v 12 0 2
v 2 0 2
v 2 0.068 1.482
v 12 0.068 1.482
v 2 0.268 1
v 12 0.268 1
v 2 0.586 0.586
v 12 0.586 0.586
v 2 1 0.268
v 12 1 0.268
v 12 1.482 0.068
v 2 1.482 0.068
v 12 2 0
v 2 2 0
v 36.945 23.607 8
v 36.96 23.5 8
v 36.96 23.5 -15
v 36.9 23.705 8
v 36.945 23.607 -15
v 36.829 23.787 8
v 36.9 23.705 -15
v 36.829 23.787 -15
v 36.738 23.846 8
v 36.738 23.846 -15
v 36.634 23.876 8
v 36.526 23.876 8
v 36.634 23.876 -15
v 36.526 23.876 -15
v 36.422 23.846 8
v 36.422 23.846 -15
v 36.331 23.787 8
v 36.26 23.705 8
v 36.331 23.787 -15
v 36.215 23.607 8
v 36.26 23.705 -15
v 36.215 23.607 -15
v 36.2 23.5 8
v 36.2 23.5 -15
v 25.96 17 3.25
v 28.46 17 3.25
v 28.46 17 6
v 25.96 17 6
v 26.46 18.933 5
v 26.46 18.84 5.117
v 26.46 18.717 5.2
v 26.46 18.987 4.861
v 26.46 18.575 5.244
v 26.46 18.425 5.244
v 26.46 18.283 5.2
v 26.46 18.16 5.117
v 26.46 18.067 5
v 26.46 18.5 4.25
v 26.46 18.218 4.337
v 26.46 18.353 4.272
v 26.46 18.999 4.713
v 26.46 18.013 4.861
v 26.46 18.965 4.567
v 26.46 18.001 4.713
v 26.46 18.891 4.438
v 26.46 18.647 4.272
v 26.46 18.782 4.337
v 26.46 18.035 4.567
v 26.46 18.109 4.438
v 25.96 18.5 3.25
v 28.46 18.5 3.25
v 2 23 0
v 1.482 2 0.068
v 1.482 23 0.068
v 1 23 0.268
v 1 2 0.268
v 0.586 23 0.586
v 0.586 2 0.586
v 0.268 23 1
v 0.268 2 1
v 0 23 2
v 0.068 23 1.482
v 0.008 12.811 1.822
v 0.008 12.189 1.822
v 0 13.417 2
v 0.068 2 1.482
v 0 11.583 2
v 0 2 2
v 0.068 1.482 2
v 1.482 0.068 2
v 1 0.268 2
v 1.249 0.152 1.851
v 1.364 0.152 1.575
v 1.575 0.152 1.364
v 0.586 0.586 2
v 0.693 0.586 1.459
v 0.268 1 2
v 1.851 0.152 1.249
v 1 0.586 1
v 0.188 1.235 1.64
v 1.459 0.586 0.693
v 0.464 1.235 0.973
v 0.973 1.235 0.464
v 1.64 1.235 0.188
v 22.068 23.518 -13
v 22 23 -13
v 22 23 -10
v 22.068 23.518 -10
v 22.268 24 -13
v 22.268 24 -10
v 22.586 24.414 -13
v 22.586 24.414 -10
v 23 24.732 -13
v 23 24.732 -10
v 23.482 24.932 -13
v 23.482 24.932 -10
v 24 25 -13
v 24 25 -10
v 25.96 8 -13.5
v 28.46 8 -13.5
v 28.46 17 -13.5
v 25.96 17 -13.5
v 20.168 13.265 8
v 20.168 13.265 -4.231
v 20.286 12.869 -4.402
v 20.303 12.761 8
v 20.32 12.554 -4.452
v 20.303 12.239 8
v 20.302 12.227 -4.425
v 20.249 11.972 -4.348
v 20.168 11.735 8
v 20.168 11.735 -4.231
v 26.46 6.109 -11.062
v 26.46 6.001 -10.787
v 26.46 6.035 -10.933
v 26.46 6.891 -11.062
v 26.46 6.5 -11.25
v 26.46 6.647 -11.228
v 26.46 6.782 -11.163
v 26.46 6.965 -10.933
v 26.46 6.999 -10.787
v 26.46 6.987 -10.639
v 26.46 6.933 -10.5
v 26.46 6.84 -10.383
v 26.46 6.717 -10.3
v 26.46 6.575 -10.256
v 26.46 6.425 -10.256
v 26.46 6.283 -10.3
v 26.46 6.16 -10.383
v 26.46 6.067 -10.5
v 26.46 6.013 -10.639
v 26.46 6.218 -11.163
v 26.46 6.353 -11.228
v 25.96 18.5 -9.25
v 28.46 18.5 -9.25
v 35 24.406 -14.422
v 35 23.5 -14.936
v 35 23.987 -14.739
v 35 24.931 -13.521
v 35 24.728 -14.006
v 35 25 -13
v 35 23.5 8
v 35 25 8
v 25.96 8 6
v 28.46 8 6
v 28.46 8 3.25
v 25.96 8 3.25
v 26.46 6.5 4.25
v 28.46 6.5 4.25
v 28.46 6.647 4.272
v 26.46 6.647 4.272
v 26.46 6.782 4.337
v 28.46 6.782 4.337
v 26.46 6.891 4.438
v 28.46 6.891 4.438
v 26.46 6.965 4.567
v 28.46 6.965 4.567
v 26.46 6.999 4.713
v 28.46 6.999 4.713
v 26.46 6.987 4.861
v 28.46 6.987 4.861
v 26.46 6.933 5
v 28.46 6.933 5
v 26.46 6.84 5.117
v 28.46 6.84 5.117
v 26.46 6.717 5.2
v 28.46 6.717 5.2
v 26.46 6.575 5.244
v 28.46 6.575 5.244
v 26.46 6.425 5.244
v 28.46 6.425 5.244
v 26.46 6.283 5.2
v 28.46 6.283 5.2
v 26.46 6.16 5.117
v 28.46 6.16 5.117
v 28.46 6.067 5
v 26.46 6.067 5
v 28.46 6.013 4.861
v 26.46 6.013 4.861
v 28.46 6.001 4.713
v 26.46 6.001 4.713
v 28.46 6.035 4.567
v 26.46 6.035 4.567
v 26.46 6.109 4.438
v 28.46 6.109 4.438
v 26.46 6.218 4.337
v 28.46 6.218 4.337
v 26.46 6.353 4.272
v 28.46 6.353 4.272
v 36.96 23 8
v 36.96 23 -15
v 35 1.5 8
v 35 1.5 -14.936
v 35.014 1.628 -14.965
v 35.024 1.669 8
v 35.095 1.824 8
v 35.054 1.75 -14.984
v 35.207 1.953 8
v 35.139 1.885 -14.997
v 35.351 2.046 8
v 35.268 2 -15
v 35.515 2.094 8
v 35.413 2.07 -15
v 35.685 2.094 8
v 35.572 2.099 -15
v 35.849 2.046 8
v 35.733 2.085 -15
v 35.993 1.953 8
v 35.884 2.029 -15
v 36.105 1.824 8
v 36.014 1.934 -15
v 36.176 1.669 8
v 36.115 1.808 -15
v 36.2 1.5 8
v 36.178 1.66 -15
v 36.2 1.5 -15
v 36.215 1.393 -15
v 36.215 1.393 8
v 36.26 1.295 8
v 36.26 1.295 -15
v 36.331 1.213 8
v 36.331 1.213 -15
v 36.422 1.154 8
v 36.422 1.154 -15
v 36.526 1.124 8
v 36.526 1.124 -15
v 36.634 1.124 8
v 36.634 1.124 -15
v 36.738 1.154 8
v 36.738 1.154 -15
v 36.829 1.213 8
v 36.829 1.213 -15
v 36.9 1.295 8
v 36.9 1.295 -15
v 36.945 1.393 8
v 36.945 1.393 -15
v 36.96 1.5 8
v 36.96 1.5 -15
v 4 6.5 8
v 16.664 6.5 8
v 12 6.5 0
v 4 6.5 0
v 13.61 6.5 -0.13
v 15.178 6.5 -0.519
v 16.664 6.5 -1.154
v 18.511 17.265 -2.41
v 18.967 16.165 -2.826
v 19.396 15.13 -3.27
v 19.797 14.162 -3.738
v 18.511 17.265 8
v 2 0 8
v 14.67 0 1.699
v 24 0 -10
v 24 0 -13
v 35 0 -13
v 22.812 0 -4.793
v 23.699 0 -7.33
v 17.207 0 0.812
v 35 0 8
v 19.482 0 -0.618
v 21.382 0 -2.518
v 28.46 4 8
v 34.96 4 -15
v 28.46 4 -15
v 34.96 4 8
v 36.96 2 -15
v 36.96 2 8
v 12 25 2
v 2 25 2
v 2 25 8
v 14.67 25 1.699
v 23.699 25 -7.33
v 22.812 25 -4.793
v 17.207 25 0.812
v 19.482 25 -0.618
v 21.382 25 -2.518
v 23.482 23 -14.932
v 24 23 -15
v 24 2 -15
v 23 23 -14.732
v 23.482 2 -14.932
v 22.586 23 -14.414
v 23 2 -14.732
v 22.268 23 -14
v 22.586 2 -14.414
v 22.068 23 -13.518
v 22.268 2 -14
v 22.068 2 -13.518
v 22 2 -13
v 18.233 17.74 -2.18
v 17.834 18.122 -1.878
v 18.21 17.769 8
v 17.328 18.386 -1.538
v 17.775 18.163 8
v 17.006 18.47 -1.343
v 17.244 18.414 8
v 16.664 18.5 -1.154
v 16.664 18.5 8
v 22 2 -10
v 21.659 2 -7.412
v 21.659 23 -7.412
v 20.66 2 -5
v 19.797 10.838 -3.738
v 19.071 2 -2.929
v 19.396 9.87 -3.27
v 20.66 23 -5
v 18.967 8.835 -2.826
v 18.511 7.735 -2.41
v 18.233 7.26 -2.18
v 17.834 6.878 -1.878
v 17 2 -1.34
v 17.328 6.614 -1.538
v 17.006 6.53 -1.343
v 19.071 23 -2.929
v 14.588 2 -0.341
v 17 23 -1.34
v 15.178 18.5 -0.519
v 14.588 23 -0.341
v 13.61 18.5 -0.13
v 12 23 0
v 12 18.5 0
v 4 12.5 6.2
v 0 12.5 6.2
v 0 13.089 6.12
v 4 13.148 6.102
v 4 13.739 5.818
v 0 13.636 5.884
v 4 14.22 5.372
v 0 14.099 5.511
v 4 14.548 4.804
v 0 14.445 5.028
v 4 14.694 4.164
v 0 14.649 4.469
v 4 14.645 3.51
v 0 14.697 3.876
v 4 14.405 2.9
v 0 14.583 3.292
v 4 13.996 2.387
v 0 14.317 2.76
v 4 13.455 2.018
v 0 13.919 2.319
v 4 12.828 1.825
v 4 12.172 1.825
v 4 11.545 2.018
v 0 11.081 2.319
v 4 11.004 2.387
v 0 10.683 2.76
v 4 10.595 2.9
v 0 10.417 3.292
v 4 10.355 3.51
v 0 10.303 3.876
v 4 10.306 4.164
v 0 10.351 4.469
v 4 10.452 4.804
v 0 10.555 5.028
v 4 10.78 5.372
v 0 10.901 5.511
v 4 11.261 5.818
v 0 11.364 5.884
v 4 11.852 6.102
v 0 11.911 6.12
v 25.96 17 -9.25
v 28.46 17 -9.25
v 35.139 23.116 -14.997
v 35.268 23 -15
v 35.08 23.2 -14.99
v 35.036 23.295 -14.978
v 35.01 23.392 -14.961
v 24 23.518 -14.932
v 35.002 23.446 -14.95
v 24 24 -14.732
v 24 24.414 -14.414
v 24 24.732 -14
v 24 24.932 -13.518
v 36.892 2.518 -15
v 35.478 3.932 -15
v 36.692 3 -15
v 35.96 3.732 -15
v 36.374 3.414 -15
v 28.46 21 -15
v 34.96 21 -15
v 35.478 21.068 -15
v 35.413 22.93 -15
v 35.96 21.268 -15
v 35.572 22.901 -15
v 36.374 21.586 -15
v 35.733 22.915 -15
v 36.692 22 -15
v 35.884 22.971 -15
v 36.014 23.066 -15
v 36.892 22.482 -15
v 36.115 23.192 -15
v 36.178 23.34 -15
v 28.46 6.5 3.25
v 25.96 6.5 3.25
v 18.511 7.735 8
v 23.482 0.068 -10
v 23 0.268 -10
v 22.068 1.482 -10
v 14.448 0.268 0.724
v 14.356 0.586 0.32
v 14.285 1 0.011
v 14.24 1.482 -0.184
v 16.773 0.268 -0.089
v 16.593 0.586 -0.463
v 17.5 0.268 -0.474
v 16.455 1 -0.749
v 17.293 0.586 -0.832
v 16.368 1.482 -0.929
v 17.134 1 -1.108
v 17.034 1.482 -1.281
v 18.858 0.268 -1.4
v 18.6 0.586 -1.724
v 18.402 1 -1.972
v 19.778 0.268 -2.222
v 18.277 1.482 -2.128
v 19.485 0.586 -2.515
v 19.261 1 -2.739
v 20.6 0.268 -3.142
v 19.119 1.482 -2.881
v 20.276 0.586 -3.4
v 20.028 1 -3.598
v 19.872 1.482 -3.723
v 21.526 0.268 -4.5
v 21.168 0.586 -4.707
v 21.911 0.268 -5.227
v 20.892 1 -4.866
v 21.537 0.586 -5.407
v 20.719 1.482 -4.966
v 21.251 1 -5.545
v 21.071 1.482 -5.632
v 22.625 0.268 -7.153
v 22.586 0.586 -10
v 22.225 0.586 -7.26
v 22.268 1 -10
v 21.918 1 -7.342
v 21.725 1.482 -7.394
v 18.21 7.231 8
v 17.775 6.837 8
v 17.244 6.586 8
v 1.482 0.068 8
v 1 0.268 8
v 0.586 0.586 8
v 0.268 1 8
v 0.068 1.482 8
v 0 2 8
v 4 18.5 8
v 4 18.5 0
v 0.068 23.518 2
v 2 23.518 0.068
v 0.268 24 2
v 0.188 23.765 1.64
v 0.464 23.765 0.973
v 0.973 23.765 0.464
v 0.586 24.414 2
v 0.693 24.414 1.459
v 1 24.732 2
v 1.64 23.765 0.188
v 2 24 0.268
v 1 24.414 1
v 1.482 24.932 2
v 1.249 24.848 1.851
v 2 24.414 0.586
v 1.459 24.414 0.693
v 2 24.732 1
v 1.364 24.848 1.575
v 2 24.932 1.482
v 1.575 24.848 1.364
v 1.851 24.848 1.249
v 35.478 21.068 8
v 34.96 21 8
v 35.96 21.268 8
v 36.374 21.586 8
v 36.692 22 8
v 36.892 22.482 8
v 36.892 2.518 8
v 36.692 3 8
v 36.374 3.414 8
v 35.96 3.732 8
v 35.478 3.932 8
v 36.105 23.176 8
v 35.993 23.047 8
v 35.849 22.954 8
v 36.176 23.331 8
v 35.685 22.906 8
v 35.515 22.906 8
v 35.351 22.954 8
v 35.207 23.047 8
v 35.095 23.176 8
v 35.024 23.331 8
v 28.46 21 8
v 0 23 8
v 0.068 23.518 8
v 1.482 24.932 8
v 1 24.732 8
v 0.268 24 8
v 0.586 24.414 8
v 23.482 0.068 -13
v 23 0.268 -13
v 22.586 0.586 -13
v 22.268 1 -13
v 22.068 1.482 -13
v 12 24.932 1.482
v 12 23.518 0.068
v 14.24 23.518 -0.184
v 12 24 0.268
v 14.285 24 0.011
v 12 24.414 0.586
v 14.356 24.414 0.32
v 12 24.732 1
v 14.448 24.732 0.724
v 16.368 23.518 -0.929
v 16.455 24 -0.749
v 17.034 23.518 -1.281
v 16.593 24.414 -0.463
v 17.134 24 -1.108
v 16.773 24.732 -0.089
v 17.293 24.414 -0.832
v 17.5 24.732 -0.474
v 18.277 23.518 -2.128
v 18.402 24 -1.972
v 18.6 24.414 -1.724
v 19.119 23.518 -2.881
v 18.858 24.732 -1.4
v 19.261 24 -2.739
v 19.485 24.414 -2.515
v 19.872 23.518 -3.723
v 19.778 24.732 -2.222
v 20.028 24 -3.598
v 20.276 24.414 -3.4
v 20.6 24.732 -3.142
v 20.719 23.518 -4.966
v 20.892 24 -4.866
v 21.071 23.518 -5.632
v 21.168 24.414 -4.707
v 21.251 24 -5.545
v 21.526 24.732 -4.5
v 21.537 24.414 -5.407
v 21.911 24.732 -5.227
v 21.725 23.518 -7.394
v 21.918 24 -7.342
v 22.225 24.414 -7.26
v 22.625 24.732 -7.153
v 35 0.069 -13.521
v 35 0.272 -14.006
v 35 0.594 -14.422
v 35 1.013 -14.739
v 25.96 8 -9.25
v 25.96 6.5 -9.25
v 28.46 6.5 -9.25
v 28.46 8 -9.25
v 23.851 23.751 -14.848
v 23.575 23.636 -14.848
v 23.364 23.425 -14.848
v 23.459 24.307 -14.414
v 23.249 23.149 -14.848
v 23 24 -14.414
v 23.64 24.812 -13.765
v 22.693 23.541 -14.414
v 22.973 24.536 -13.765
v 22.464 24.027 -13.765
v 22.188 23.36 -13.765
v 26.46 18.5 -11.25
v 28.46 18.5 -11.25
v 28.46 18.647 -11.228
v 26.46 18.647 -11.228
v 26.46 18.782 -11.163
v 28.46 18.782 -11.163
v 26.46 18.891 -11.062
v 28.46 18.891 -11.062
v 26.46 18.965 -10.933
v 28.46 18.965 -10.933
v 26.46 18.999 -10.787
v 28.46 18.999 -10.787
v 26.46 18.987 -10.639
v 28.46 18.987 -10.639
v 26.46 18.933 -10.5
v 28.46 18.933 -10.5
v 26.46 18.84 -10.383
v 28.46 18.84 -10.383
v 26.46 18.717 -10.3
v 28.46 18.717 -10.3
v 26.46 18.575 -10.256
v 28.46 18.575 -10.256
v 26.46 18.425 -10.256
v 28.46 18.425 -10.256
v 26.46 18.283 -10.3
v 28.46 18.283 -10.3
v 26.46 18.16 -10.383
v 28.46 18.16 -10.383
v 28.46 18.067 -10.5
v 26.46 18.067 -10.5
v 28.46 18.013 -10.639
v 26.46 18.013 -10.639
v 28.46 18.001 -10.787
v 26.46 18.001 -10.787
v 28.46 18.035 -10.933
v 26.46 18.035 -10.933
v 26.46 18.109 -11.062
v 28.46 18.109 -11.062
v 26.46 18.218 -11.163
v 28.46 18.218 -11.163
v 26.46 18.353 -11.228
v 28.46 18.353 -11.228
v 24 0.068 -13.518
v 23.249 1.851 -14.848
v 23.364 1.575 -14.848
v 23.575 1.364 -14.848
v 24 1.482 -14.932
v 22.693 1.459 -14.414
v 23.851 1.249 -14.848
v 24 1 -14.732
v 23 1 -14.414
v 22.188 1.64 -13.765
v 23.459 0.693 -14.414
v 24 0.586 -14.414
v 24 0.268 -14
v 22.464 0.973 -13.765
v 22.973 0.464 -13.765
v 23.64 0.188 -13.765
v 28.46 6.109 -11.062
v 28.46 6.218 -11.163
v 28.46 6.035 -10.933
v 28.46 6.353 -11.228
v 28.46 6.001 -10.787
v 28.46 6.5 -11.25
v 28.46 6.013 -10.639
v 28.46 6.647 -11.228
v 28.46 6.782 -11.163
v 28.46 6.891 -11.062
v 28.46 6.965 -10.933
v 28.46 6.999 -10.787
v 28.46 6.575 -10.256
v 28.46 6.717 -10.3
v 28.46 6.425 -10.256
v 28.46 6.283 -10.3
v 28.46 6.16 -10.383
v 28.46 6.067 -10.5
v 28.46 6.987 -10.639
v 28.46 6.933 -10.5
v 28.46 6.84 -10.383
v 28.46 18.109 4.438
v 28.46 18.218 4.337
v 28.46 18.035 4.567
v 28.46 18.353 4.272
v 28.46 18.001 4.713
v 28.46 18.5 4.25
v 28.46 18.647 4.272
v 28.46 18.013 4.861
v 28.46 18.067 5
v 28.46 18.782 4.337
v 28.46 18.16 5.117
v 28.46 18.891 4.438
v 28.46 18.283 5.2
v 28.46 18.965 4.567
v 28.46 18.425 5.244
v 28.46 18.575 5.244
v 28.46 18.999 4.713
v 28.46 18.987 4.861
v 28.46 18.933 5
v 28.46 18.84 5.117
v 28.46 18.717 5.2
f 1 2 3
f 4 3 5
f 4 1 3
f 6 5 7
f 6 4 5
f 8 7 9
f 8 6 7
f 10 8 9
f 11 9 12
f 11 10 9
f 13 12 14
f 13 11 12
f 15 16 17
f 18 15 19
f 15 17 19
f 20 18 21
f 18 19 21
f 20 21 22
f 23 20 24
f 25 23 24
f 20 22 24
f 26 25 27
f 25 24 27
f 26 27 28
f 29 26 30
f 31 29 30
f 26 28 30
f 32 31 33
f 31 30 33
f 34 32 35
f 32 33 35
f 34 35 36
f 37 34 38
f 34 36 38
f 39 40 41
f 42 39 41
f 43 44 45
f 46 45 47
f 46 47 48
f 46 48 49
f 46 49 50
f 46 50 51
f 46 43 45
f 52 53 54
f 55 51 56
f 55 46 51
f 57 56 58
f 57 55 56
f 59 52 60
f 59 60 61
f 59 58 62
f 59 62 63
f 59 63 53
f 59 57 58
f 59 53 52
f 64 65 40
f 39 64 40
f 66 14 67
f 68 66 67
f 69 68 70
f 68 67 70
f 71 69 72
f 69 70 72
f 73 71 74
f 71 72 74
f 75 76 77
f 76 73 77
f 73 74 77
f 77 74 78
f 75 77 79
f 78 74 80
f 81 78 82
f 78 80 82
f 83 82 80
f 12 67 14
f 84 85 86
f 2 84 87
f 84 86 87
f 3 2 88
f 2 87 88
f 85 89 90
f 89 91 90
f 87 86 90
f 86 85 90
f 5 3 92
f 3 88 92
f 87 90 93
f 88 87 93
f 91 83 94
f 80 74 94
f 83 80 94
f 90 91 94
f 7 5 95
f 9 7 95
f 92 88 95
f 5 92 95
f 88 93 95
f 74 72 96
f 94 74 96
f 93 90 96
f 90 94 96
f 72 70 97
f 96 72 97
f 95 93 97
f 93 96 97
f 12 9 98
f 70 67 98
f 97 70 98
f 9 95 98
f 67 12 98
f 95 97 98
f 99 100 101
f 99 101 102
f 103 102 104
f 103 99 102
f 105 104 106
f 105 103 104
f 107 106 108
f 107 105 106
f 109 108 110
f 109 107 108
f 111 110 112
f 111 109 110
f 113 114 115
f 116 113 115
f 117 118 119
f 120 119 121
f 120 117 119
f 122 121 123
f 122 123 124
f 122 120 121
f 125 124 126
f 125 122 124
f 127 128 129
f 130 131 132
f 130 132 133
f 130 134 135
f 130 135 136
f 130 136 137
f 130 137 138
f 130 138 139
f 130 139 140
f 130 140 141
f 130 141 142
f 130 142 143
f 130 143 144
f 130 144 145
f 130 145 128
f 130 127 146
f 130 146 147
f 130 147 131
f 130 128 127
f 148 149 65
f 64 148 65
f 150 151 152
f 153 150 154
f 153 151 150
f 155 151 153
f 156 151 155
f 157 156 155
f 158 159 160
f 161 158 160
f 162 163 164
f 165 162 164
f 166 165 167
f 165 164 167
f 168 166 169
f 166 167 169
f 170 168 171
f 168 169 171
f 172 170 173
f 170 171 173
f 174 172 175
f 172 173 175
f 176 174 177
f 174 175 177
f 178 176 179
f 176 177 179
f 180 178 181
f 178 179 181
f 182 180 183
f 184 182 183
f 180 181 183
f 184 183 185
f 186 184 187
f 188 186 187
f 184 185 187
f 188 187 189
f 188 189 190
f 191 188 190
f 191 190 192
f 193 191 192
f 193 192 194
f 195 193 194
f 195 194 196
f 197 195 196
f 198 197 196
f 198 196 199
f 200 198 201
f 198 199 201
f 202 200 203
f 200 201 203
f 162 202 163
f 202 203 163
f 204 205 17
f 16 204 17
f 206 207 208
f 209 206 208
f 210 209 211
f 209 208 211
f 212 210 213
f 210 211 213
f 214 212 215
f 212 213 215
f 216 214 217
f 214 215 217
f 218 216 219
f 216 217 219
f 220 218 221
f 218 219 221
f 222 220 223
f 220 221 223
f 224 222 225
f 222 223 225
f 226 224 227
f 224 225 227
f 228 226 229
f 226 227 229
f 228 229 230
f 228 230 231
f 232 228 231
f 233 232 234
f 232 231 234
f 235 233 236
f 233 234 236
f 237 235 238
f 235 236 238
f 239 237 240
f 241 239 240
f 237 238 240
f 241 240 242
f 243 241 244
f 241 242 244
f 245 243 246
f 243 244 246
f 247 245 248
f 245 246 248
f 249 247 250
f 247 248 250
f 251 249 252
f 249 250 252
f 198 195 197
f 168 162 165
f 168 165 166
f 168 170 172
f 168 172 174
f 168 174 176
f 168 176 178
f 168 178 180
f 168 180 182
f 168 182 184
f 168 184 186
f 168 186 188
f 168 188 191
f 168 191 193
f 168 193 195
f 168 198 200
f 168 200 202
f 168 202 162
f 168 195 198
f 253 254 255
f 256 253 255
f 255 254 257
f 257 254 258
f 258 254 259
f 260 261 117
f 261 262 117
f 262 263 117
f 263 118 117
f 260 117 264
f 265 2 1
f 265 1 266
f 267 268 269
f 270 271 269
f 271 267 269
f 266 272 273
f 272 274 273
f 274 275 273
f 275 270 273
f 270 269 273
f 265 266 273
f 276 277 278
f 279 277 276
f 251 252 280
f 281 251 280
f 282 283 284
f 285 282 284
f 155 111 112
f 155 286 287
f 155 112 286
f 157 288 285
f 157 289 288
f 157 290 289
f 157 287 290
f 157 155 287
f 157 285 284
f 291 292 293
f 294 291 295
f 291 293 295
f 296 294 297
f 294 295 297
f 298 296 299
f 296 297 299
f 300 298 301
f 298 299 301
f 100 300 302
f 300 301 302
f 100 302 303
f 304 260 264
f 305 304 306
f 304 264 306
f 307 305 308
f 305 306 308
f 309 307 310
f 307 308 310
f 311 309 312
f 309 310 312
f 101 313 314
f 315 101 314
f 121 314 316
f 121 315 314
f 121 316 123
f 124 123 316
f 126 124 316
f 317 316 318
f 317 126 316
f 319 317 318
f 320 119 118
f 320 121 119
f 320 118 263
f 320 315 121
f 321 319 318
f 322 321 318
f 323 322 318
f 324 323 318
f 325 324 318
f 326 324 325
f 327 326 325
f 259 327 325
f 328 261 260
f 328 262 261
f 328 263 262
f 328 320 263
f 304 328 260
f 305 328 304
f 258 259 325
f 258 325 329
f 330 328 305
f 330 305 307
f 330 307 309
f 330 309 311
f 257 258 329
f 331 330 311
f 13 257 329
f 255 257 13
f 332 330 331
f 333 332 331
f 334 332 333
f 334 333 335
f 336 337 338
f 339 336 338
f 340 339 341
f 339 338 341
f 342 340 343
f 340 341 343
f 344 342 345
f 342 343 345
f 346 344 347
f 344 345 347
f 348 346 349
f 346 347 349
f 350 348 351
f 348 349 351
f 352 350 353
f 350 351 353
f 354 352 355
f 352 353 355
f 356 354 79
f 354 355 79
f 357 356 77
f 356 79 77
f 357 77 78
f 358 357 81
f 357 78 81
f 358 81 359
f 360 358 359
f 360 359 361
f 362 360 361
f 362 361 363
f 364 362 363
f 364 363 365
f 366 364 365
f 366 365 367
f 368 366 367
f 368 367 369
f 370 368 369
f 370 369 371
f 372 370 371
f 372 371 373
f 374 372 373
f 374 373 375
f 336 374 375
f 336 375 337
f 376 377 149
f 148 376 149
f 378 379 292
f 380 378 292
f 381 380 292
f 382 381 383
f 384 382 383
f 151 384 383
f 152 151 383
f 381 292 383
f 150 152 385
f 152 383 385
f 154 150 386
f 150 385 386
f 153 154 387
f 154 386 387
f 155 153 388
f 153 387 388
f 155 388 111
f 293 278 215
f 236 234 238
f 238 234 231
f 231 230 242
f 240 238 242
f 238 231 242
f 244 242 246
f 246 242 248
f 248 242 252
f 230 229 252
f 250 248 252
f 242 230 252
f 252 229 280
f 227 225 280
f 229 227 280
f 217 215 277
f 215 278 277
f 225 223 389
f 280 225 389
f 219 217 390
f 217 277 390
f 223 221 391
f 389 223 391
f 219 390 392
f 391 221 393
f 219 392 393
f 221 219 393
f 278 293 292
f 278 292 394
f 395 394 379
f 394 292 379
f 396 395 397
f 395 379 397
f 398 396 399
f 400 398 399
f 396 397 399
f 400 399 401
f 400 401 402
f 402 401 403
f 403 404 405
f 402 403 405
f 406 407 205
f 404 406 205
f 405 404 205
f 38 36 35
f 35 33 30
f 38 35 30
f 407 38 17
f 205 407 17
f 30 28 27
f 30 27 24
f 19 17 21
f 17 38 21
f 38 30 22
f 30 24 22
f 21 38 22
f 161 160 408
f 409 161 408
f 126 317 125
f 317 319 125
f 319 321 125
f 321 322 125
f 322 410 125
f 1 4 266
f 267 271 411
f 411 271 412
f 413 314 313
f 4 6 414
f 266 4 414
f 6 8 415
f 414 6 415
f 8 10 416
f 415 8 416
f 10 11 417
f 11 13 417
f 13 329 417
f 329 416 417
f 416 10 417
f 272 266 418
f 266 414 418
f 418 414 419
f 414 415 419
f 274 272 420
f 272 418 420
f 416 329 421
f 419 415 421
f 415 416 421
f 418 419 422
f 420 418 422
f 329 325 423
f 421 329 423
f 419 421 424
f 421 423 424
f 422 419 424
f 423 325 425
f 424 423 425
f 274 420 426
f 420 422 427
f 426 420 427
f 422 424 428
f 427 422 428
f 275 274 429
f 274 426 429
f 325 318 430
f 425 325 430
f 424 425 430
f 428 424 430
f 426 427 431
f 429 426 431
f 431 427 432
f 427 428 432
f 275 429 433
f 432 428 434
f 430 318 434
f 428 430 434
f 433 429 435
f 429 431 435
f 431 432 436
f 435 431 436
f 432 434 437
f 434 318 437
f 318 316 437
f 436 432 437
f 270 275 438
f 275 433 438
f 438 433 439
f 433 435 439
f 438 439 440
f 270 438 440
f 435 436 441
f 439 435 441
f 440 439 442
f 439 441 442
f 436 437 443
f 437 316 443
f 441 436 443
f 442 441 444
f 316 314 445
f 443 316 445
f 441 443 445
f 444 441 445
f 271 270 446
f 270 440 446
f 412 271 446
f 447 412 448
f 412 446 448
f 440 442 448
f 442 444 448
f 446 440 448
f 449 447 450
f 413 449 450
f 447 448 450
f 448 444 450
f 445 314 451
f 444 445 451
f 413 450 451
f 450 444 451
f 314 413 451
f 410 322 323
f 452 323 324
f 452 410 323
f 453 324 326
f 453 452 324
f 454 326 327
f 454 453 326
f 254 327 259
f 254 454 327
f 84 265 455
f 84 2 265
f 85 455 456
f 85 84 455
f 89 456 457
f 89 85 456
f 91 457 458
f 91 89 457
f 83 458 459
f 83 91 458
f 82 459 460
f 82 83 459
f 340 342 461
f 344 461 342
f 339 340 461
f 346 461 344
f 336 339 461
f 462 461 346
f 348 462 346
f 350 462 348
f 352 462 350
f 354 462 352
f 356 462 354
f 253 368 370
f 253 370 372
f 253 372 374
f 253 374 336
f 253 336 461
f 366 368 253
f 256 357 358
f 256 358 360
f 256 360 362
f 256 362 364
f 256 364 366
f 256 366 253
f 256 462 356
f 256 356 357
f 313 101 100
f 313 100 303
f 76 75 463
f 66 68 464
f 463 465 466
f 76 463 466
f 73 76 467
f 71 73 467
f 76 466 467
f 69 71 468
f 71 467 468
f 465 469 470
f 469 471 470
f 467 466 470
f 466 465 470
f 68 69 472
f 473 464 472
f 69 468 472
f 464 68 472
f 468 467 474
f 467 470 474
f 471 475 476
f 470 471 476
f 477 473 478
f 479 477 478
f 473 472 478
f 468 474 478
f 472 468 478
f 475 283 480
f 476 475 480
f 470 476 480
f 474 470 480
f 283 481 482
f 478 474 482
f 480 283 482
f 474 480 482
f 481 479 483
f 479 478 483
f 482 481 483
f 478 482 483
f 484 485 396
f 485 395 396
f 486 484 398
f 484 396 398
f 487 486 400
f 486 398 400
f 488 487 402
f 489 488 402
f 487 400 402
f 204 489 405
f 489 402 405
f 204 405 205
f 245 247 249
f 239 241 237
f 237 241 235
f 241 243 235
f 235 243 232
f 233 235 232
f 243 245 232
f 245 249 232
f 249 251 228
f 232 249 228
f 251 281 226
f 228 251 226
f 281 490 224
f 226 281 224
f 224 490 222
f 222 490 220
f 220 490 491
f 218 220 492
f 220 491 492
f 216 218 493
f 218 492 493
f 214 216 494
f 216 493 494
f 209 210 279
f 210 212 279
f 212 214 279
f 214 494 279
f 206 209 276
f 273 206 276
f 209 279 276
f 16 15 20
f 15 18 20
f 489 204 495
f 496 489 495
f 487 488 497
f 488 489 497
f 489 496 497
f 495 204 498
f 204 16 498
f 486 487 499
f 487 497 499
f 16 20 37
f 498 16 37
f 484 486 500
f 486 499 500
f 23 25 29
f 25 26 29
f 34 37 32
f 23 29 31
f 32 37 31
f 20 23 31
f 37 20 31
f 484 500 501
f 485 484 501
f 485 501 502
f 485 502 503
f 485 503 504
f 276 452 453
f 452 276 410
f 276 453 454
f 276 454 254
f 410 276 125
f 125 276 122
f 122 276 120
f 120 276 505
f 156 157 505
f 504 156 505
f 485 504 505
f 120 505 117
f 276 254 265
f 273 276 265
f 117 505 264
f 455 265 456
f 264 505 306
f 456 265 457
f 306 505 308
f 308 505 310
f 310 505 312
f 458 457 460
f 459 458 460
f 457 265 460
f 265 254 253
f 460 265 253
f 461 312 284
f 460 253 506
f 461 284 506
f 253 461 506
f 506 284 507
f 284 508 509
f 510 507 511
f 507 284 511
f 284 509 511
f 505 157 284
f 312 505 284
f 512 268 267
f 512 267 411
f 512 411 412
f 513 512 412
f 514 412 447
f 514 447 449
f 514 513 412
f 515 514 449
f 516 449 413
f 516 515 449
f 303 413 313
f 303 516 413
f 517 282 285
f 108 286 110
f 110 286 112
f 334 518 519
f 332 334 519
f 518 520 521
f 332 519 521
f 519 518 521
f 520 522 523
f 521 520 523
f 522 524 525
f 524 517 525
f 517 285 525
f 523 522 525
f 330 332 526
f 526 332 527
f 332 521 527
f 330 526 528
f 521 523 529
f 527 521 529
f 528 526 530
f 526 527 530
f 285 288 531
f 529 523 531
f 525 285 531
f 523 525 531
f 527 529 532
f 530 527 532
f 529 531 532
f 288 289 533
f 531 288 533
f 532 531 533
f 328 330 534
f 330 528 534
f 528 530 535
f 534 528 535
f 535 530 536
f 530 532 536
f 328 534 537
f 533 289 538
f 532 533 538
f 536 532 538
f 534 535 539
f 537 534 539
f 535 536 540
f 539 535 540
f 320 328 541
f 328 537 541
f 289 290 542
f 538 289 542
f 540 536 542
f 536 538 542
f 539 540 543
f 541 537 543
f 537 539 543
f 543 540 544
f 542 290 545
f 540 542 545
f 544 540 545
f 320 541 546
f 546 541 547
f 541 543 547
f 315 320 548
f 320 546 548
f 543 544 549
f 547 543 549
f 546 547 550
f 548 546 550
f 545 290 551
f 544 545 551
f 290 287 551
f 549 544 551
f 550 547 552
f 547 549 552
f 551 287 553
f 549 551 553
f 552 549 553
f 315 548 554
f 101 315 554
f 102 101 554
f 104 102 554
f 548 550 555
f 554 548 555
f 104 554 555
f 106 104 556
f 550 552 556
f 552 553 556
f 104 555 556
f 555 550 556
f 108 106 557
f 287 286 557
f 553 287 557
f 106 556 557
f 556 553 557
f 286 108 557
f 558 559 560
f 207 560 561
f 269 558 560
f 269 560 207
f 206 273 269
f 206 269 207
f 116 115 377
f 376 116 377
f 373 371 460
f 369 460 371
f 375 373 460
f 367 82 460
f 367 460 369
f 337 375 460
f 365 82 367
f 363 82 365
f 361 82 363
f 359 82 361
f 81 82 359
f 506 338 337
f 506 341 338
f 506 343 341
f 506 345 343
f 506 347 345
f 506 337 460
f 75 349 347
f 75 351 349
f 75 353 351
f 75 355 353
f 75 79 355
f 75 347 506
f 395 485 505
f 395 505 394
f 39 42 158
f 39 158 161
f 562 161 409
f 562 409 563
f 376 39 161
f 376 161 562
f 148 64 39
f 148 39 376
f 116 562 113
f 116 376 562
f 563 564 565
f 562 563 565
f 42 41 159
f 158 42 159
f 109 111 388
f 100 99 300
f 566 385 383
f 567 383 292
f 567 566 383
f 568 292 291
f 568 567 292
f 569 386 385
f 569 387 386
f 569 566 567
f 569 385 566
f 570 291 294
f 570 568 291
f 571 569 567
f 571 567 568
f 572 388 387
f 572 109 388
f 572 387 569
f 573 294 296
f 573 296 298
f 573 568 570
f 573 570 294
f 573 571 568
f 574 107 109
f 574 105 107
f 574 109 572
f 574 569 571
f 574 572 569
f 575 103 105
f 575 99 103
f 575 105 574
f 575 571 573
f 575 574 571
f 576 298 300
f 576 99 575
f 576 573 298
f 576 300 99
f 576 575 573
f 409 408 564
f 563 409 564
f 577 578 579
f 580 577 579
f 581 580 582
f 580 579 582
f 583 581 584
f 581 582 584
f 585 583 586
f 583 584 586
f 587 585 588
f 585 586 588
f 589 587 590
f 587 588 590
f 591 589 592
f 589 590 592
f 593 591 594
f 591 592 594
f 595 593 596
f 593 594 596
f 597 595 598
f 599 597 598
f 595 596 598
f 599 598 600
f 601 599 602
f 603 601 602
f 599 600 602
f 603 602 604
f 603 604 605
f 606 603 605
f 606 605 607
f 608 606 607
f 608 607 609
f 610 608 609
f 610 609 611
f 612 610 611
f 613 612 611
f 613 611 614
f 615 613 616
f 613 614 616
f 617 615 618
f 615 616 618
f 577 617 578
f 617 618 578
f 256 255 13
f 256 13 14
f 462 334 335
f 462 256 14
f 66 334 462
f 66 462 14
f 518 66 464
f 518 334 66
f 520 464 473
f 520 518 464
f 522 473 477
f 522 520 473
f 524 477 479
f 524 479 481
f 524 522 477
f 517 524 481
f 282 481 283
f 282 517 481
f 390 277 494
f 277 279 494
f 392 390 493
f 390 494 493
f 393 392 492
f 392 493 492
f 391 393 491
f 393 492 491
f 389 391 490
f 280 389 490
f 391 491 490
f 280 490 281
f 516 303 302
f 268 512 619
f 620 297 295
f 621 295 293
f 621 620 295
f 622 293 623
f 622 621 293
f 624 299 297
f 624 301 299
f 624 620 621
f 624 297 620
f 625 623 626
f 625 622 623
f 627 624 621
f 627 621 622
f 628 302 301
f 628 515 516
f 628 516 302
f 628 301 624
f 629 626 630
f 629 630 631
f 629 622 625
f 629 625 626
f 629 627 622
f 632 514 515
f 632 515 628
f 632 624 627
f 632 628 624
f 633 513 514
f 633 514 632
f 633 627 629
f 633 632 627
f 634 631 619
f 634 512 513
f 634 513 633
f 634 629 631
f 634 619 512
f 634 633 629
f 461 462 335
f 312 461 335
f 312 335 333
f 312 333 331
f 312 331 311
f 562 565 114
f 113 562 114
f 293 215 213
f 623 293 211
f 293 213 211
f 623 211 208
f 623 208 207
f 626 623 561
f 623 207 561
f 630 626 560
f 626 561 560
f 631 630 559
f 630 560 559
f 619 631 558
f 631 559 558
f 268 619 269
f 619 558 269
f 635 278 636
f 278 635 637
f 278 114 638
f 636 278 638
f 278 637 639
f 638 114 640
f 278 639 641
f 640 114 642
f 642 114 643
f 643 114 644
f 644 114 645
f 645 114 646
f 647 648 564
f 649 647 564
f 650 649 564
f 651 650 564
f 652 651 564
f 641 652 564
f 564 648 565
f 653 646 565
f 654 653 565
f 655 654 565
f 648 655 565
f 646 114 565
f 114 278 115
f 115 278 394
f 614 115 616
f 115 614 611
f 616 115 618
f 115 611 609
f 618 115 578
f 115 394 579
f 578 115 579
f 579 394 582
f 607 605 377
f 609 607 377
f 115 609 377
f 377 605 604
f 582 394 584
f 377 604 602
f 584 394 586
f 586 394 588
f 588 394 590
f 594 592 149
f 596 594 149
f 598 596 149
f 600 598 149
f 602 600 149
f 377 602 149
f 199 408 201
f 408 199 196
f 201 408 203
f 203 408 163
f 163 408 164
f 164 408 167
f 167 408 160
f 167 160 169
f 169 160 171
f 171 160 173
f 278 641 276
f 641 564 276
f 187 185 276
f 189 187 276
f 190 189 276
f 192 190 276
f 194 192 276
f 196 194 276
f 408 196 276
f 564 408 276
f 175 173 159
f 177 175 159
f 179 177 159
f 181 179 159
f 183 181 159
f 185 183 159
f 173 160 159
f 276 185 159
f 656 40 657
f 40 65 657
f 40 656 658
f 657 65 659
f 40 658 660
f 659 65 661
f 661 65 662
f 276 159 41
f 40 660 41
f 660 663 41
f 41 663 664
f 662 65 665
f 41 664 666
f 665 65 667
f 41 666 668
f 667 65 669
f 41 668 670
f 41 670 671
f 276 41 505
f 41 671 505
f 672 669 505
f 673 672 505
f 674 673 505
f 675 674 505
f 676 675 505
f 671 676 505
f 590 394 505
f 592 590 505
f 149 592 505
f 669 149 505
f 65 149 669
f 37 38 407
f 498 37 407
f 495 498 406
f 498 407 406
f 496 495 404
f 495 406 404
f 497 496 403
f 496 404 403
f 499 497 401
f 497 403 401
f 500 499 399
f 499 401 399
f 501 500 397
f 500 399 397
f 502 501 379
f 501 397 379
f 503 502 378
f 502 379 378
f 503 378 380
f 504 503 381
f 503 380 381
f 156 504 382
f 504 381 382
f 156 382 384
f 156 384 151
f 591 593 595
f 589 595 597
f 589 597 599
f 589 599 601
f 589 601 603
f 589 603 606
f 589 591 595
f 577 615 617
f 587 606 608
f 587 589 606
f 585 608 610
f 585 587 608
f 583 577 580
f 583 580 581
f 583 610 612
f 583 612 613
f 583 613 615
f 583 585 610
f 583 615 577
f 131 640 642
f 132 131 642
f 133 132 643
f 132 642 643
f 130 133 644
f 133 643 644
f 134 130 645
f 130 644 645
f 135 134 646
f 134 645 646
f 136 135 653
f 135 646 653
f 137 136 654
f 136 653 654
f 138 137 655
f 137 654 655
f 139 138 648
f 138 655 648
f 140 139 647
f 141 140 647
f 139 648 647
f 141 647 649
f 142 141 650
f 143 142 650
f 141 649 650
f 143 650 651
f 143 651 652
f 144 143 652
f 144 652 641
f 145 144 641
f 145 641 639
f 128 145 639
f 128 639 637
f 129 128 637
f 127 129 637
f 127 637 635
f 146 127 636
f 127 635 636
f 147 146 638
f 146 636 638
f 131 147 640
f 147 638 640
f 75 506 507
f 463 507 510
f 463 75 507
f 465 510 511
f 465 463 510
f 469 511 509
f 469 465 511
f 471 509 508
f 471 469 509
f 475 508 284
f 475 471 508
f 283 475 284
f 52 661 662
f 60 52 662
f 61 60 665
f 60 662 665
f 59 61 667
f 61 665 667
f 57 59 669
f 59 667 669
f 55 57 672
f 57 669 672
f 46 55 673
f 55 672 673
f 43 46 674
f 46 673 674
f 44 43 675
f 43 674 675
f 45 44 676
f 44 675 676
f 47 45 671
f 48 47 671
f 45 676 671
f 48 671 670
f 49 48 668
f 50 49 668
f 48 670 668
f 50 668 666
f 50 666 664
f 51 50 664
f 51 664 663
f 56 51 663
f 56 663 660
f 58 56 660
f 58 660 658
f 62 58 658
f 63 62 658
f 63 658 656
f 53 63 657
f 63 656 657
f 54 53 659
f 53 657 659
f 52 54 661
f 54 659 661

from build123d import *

# Parameters (mm, degrees)
P_IDAT_VYSUNUT_M1_DEPTH  = 8
SKICA2_R                 = 2.2
ODEBRAT_VYSUNUT_M1_DEPTH = 8
P_IDAT_VYSUNUT_M3_DEPTH  = 15
ZAOBLIT3_R               = 10
ZAOBLIT5_R               = 2
ZAOBLIT6_R               = 2
ZAOBLIT7_R               = 2
P_IDAT_VYSUNUT_M6_DEPTH  = 23
ZAOBLIT12_R              = 2
ZAOBLIT13_R              = 2
ZAOBLIT14_R              = 2
ZAOBLIT15_R              = 2
ODEBRAT_VYSUNUT_M4_DEPTH = 8.5
ZAOBLIT18_R              = 2
ZAOBLIT19_R              = 2
SKICA8_R                 = 0.5000000000000009
SKICA8_W                 = 12.000000000000004
SKICA8_H                 = 9
ODEBRAT_VYSUNUT_M5_DEPTH = 2
SKICA9_W                 = 12.000000000000004
SKICA9_H                 = 9
ODEBRAT_VYSUNUT_M6_DEPTH = 2.5


with BuildPart() as part:
    # Skica1 → Přidat vysunutím1 (new body)
    with BuildSketch(Plane.XY):
        Polygon((0, 0), (0, 25), (35, 25.000000000000004), (35, -3.47e-15), align=None)
        Polygon((3.999999999999999, 18.500000000000004), (4, 6.500000000000001), (18, 6.500000000000001), (20.485281374238575, 12.499999999999996), (18, 18.499999999999996), align=None, mode=Mode.SUBTRACT)
    extrude(amount=P_IDAT_VYSUNUT_M1_DEPTH)

    # Skica2 → Odebrat vysunutím1 (cut)
    with BuildSketch(Plane.ZY):
        with Locations((4, 12.5)):
            Circle(SKICA2_R)
    extrude(amount=-ODEBRAT_VYSUNUT_M1_DEPTH, mode=Mode.SUBTRACT)

    # Skica3 → Přidat vysunutím3 (add)
    with BuildSketch(Plane(origin=(0, 0, 0), x_dir=(-1, 0, 0), z_dir=(0, 0, -1))):
        Polygon((-35, 25.000000000000004), (-22, 25.000000000000004), (-21.999999999999996, 0), (-35, 0), align=None)
    extrude(amount=P_IDAT_VYSUNUT_M3_DEPTH)

    # Zaoblit3
    # the kernel refuses this fillet: 10 mm, written as the material it adds along each edge
    with BuildSketch(Plane(origin=(22, 25.000000000000004, 0), x_dir=(0, 0, -1), z_dir=(-1.4e-16, -1, 0))) as zaoblit3_piece_1_section:
        with BuildLine():
            CenterArc((ZAOBLIT3_R, -ZAOBLIT3_R), ZAOBLIT3_R, 90, 90)
            Line((-1.78e-15, -ZAOBLIT3_R), (0, 0))
            Line((0, 0), (ZAOBLIT3_R, 0))
        make_face()
    zaoblit3_piece_1 = extrude(amount=49.99999999999999, mode=Mode.PRIVATE)
    zaoblit3_piece_1 = split(zaoblit3_piece_1, bisect_by=Plane(origin=(17.13517134220591, 20.587881074775396, -2.4104777479798574), z_dir=(0.9238795325112865, 0.3826834323650904, 0)), keep=Keep.TOP, mode=Mode.PRIVATE)
    add(zaoblit3_piece_1)
    with BuildSketch(Plane(origin=(22, 25.000000000000004, 0), x_dir=(0, 0, -1), z_dir=(-1.4e-16, -1, 0))) as zaoblit3_piece_2_section:
        with BuildLine():
            CenterArc((ZAOBLIT3_R, -ZAOBLIT3_R), ZAOBLIT3_R, 90, 90)
            Line((-1.78e-15, -ZAOBLIT3_R), (0, 0))
            Line((0, 0), (ZAOBLIT3_R, 0))
        make_face()
    zaoblit3_piece_2 = extrude(amount=49.99999999999999, mode=Mode.PRIVATE)
    zaoblit3_piece_2 = split(zaoblit3_piece_2, bisect_by=Plane(origin=(15.789776111016284, 18.499999999999996, -0.41218867261979963), z_dir=(5.1e-16, 1, 0)), keep=Keep.TOP, mode=Mode.PRIVATE)
    add(zaoblit3_piece_2)
    with BuildSketch(Plane(origin=(22.000000000000004, 50, 0), x_dir=(0, 0, -1), z_dir=(-1.4e-16, -1, 0))) as zaoblit3_piece_3_section:
        with BuildLine():
            CenterArc((ZAOBLIT3_R, -ZAOBLIT3_R), ZAOBLIT3_R, 90, 90)
            Line((-1.78e-15, -ZAOBLIT3_R), (0, 0))
            Line((0, 0), (ZAOBLIT3_R, 0))
        make_face()
    zaoblit3_piece_3 = extrude(amount=50, mode=Mode.PRIVATE)
    zaoblit3_piece_3 = split(zaoblit3_piece_3, bisect_by=Plane(origin=(15.78977611101612, 6.500000000000001, -0.41218867261958336), z_dir=(0, -1, 0)), keep=Keep.TOP, mode=Mode.PRIVATE)
    add(zaoblit3_piece_3)
    with BuildSketch(Plane(origin=(22.000000000000004, 50, 0), x_dir=(0, 0, -1), z_dir=(-1.4e-16, -1, 0))) as zaoblit3_piece_4_section:
        with BuildLine():
            CenterArc((ZAOBLIT3_R, -ZAOBLIT3_R), ZAOBLIT3_R, 90, 90)
            Line((-1.78e-15, -ZAOBLIT3_R), (0, 0))
            Line((0, 0), (ZAOBLIT3_R, 0))
        make_face()
    zaoblit3_piece_4 = extrude(amount=50, mode=Mode.PRIVATE)
    zaoblit3_piece_4 = split(zaoblit3_piece_4, bisect_by=Plane(origin=(19.135383660262896, 9.241058631103481, -2.632109872171155), z_dir=(0.9238795325112864, -0.38268343236509067, 0)), keep=Keep.TOP, mode=Mode.PRIVATE)
    add(zaoblit3_piece_4)

    # Zaoblit5
    # the kernel refuses this fillet: 2 mm, written as the material it takes off along each edge
    with BuildSketch(Plane(origin=(0, -5, 0), x_dir=(0, 0, 1), z_dir=(0, 1, 0))) as zaoblit5_piece_1:
        with BuildLine():
            CenterArc((ZAOBLIT5_R, ZAOBLIT5_R), ZAOBLIT5_R, 180, 90)
            Line((-2.2e-16, ZAOBLIT5_R), (0, 0))
            Line((0, 0), (ZAOBLIT5_R, 0))
        make_face()
    extrude(amount=35, mode=Mode.SUBTRACT)

    # Zaoblit6
    zaoblit6_edges = [part.edges().sort_by_distance(p)[0] for p in [
        (21.999999999999996, 0, -12.5),
        (19.071067811865476, 0, -2.9289321881345254),
        (7, -6.9e-16, 0),
        (0.5857864376269049, 0, 0.5857864376269051),
        (0, 0, 5),
    ]]
    fillet(zaoblit6_edges, radius=ZAOBLIT6_R)

    # Zaoblit7
    zaoblit7_edges = [part.edges().sort_by_distance(p)[0] for p in [
        (22, 25.000000000000004, -12.5),
        (7, 25, 0),
        (19.071067811865476, 25, -2.9289321881345245),
        (0.5857864376269049, 25, 0.5857864376269051),
        (0, 25, 5),
    ]]
    fillet(zaoblit7_edges, radius=ZAOBLIT7_R)

    # Skica6 → Přidat vysunutím6 (add)
    with BuildSketch(Plane(origin=(0, 0, -15), x_dir=(-1, 0, 0), z_dir=(0, 0, -1))):
        with BuildLine():
            Line((-35, 23.500000000000004), (-35, 1.5))
            ThreePointArc((-35, 1.5), (-35.60000000229765, 2.1000000000000085), (-36.2, 1.4999999954047263))
            ThreePointArc((-36.2, 1.4999999954047263), (-36.58, 1.1199999924943909), (-36.96, 1.4999999954047263))
            Line((-36.96, 1.4999999954047263), (-36.959999999999994, 23.500000000000096))
            ThreePointArc((-36.959999999999994, 23.500000000000096), (-36.58, 23.88000000000009), (-36.2, 23.500000000000096))
            ThreePointArc((-36.2, 23.500000000000096), (-35.60000000000006, 22.9), (-35, 23.500000000000004))
        make_face()
    extrude(amount=-P_IDAT_VYSUNUT_M6_DEPTH)

    # Zaoblit12
    zaoblit12_edges = [part.edges().sort_by_distance(p)[0] for p in [
        (29.5, 0, -15),
        (22.5857864376269, 0.5857864376269046, -15),
        (29.5, 25.000000000000004, -15),
        (22.585786437626904, 24.414213562373096, -15),
        (21.999999999999996, 12.5, -15),
    ]]
    fillet(zaoblit12_edges, radius=ZAOBLIT12_R)

    # Zaoblit13
    zaoblit13_edges = [part.edges().sort_by_distance(p)[0] for p in [
        (20.485281374238724, 12.499999999999886, 1.6457513110643447),
    ]]
    fillet(zaoblit13_edges, radius=ZAOBLIT13_R)

    # Zaoblit14
    zaoblit14_edges = [part.edges().sort_by_distance(p)[0] for p in [
        (17.99999999999998, 18.500000000000004, 3.000000000000016),
    ]]
    fillet(zaoblit14_edges, radius=ZAOBLIT14_R)

    # Zaoblit15
    zaoblit15_edges = [part.edges().sort_by_distance(p)[0] for p in [
        (18.0000000000001, 6.499999999999996, 2.9999999999999263),
    ]]
    fillet(zaoblit15_edges, radius=ZAOBLIT15_R)

    # Skica7 → Odebrat vysunutím4 (cut)
    with BuildSketch(Plane(origin=(36.96, 1.166e-14, 0), x_dir=(0, 0, -1), z_dir=(1, 0, 0))):
        Polygon((-8, 21.00000000000012), (15, 21.00000000000012), (15.000000000000005, 4.000000000000118), (-7.999999999999998, 4.000000000000118), align=None)
    extrude(amount=-ODEBRAT_VYSUNUT_M4_DEPTH, mode=Mode.SUBTRACT)

    # Zaoblit18
    zaoblit18_edges = [part.edges().sort_by_distance(p)[0] for p in [
        (36.96, 21.00000000000013, -3.5),
    ]]
    fillet(zaoblit18_edges, radius=ZAOBLIT18_R)

    # Zaoblit19
    zaoblit19_edges = [part.edges().sort_by_distance(p)[0] for p in [
        (36.96, 4.00000000000013, -3.5000000000000036),
    ]]
    fillet(zaoblit19_edges, radius=ZAOBLIT19_R)

    # Skica8 → Odebrat vysunutím5 (cut)
    with BuildSketch(Plane(origin=(28.46, 0, 0), x_dir=(0, 0, -1), z_dir=(1, 0, 0))):
        with Locations((-4.750000000000001, 18.50000000000013)):
            Circle(SKICA8_R)
        with Locations((-4.750000000000001, 6.500000000000129)):
            Circle(SKICA8_R)
        with Locations((10.750000000000002, 18.50000000000013)):
            Circle(SKICA8_R)
        with Locations((10.750000000000002, 6.500000000000129)):
            Circle(SKICA8_R)
        with Locations((3.000000000000002, 12.500000000000128)):
            Rectangle(SKICA8_W, SKICA8_H)
    extrude(amount=-ODEBRAT_VYSUNUT_M5_DEPTH, mode=Mode.SUBTRACT)

    # Skica9 → Odebrat vysunutím6 (cut)
    with BuildSketch(Plane(origin=(28.46, 0, 0), x_dir=(0, 0, -1), z_dir=(1, 0, 0))):
        Polygon((-3.250000000000001, 17.000000000000128), (-5.999999999999998, 17.000000000000128), (-5.999999999999997, 8.000000000000128), (-3.2500000000000004, 8.000000000000128), (-2.9999999999999987, 8.000000000000128), (-2.9999999999999987, 17.000000000000128), align=None)
        Polygon((-3.250000000000001, 18.50000000000013), (-3.250000000000001, 17.000000000000128), (-2.9999999999999987, 17.000000000000128), (9.000000000000004, 17.000000000000128), (9.250000000000002, 17.000000000000128), (9.250000000000002, 18.50000000000013), align=None)
        Polygon((9.250000000000002, 17.000000000000128), (9.000000000000004, 17.000000000000128), (9.000000000000004, 8.000000000000128), (9.250000000000004, 8.000000000000128), (13.500000000000004, 8.000000000000128), (13.500000000000002, 17.000000000000128), align=None)
        with Locations((3.000000000000002, 12.500000000000128)):
            Rectangle(SKICA9_W, SKICA9_H)
        Polygon((-2.9999999999999987, 8.000000000000128), (-3.2500000000000004, 8.000000000000128), (-3.2500000000000004, 6.500000000000129), (9.250000000000002, 6.500000000000129), (9.250000000000002, 8.000000000000128), (9.000000000000004, 8.000000000000128), align=None)
    extrude(amount=-ODEBRAT_VYSUNUT_M6_DEPTH, mode=Mode.SUBTRACT)


solid = part.part
